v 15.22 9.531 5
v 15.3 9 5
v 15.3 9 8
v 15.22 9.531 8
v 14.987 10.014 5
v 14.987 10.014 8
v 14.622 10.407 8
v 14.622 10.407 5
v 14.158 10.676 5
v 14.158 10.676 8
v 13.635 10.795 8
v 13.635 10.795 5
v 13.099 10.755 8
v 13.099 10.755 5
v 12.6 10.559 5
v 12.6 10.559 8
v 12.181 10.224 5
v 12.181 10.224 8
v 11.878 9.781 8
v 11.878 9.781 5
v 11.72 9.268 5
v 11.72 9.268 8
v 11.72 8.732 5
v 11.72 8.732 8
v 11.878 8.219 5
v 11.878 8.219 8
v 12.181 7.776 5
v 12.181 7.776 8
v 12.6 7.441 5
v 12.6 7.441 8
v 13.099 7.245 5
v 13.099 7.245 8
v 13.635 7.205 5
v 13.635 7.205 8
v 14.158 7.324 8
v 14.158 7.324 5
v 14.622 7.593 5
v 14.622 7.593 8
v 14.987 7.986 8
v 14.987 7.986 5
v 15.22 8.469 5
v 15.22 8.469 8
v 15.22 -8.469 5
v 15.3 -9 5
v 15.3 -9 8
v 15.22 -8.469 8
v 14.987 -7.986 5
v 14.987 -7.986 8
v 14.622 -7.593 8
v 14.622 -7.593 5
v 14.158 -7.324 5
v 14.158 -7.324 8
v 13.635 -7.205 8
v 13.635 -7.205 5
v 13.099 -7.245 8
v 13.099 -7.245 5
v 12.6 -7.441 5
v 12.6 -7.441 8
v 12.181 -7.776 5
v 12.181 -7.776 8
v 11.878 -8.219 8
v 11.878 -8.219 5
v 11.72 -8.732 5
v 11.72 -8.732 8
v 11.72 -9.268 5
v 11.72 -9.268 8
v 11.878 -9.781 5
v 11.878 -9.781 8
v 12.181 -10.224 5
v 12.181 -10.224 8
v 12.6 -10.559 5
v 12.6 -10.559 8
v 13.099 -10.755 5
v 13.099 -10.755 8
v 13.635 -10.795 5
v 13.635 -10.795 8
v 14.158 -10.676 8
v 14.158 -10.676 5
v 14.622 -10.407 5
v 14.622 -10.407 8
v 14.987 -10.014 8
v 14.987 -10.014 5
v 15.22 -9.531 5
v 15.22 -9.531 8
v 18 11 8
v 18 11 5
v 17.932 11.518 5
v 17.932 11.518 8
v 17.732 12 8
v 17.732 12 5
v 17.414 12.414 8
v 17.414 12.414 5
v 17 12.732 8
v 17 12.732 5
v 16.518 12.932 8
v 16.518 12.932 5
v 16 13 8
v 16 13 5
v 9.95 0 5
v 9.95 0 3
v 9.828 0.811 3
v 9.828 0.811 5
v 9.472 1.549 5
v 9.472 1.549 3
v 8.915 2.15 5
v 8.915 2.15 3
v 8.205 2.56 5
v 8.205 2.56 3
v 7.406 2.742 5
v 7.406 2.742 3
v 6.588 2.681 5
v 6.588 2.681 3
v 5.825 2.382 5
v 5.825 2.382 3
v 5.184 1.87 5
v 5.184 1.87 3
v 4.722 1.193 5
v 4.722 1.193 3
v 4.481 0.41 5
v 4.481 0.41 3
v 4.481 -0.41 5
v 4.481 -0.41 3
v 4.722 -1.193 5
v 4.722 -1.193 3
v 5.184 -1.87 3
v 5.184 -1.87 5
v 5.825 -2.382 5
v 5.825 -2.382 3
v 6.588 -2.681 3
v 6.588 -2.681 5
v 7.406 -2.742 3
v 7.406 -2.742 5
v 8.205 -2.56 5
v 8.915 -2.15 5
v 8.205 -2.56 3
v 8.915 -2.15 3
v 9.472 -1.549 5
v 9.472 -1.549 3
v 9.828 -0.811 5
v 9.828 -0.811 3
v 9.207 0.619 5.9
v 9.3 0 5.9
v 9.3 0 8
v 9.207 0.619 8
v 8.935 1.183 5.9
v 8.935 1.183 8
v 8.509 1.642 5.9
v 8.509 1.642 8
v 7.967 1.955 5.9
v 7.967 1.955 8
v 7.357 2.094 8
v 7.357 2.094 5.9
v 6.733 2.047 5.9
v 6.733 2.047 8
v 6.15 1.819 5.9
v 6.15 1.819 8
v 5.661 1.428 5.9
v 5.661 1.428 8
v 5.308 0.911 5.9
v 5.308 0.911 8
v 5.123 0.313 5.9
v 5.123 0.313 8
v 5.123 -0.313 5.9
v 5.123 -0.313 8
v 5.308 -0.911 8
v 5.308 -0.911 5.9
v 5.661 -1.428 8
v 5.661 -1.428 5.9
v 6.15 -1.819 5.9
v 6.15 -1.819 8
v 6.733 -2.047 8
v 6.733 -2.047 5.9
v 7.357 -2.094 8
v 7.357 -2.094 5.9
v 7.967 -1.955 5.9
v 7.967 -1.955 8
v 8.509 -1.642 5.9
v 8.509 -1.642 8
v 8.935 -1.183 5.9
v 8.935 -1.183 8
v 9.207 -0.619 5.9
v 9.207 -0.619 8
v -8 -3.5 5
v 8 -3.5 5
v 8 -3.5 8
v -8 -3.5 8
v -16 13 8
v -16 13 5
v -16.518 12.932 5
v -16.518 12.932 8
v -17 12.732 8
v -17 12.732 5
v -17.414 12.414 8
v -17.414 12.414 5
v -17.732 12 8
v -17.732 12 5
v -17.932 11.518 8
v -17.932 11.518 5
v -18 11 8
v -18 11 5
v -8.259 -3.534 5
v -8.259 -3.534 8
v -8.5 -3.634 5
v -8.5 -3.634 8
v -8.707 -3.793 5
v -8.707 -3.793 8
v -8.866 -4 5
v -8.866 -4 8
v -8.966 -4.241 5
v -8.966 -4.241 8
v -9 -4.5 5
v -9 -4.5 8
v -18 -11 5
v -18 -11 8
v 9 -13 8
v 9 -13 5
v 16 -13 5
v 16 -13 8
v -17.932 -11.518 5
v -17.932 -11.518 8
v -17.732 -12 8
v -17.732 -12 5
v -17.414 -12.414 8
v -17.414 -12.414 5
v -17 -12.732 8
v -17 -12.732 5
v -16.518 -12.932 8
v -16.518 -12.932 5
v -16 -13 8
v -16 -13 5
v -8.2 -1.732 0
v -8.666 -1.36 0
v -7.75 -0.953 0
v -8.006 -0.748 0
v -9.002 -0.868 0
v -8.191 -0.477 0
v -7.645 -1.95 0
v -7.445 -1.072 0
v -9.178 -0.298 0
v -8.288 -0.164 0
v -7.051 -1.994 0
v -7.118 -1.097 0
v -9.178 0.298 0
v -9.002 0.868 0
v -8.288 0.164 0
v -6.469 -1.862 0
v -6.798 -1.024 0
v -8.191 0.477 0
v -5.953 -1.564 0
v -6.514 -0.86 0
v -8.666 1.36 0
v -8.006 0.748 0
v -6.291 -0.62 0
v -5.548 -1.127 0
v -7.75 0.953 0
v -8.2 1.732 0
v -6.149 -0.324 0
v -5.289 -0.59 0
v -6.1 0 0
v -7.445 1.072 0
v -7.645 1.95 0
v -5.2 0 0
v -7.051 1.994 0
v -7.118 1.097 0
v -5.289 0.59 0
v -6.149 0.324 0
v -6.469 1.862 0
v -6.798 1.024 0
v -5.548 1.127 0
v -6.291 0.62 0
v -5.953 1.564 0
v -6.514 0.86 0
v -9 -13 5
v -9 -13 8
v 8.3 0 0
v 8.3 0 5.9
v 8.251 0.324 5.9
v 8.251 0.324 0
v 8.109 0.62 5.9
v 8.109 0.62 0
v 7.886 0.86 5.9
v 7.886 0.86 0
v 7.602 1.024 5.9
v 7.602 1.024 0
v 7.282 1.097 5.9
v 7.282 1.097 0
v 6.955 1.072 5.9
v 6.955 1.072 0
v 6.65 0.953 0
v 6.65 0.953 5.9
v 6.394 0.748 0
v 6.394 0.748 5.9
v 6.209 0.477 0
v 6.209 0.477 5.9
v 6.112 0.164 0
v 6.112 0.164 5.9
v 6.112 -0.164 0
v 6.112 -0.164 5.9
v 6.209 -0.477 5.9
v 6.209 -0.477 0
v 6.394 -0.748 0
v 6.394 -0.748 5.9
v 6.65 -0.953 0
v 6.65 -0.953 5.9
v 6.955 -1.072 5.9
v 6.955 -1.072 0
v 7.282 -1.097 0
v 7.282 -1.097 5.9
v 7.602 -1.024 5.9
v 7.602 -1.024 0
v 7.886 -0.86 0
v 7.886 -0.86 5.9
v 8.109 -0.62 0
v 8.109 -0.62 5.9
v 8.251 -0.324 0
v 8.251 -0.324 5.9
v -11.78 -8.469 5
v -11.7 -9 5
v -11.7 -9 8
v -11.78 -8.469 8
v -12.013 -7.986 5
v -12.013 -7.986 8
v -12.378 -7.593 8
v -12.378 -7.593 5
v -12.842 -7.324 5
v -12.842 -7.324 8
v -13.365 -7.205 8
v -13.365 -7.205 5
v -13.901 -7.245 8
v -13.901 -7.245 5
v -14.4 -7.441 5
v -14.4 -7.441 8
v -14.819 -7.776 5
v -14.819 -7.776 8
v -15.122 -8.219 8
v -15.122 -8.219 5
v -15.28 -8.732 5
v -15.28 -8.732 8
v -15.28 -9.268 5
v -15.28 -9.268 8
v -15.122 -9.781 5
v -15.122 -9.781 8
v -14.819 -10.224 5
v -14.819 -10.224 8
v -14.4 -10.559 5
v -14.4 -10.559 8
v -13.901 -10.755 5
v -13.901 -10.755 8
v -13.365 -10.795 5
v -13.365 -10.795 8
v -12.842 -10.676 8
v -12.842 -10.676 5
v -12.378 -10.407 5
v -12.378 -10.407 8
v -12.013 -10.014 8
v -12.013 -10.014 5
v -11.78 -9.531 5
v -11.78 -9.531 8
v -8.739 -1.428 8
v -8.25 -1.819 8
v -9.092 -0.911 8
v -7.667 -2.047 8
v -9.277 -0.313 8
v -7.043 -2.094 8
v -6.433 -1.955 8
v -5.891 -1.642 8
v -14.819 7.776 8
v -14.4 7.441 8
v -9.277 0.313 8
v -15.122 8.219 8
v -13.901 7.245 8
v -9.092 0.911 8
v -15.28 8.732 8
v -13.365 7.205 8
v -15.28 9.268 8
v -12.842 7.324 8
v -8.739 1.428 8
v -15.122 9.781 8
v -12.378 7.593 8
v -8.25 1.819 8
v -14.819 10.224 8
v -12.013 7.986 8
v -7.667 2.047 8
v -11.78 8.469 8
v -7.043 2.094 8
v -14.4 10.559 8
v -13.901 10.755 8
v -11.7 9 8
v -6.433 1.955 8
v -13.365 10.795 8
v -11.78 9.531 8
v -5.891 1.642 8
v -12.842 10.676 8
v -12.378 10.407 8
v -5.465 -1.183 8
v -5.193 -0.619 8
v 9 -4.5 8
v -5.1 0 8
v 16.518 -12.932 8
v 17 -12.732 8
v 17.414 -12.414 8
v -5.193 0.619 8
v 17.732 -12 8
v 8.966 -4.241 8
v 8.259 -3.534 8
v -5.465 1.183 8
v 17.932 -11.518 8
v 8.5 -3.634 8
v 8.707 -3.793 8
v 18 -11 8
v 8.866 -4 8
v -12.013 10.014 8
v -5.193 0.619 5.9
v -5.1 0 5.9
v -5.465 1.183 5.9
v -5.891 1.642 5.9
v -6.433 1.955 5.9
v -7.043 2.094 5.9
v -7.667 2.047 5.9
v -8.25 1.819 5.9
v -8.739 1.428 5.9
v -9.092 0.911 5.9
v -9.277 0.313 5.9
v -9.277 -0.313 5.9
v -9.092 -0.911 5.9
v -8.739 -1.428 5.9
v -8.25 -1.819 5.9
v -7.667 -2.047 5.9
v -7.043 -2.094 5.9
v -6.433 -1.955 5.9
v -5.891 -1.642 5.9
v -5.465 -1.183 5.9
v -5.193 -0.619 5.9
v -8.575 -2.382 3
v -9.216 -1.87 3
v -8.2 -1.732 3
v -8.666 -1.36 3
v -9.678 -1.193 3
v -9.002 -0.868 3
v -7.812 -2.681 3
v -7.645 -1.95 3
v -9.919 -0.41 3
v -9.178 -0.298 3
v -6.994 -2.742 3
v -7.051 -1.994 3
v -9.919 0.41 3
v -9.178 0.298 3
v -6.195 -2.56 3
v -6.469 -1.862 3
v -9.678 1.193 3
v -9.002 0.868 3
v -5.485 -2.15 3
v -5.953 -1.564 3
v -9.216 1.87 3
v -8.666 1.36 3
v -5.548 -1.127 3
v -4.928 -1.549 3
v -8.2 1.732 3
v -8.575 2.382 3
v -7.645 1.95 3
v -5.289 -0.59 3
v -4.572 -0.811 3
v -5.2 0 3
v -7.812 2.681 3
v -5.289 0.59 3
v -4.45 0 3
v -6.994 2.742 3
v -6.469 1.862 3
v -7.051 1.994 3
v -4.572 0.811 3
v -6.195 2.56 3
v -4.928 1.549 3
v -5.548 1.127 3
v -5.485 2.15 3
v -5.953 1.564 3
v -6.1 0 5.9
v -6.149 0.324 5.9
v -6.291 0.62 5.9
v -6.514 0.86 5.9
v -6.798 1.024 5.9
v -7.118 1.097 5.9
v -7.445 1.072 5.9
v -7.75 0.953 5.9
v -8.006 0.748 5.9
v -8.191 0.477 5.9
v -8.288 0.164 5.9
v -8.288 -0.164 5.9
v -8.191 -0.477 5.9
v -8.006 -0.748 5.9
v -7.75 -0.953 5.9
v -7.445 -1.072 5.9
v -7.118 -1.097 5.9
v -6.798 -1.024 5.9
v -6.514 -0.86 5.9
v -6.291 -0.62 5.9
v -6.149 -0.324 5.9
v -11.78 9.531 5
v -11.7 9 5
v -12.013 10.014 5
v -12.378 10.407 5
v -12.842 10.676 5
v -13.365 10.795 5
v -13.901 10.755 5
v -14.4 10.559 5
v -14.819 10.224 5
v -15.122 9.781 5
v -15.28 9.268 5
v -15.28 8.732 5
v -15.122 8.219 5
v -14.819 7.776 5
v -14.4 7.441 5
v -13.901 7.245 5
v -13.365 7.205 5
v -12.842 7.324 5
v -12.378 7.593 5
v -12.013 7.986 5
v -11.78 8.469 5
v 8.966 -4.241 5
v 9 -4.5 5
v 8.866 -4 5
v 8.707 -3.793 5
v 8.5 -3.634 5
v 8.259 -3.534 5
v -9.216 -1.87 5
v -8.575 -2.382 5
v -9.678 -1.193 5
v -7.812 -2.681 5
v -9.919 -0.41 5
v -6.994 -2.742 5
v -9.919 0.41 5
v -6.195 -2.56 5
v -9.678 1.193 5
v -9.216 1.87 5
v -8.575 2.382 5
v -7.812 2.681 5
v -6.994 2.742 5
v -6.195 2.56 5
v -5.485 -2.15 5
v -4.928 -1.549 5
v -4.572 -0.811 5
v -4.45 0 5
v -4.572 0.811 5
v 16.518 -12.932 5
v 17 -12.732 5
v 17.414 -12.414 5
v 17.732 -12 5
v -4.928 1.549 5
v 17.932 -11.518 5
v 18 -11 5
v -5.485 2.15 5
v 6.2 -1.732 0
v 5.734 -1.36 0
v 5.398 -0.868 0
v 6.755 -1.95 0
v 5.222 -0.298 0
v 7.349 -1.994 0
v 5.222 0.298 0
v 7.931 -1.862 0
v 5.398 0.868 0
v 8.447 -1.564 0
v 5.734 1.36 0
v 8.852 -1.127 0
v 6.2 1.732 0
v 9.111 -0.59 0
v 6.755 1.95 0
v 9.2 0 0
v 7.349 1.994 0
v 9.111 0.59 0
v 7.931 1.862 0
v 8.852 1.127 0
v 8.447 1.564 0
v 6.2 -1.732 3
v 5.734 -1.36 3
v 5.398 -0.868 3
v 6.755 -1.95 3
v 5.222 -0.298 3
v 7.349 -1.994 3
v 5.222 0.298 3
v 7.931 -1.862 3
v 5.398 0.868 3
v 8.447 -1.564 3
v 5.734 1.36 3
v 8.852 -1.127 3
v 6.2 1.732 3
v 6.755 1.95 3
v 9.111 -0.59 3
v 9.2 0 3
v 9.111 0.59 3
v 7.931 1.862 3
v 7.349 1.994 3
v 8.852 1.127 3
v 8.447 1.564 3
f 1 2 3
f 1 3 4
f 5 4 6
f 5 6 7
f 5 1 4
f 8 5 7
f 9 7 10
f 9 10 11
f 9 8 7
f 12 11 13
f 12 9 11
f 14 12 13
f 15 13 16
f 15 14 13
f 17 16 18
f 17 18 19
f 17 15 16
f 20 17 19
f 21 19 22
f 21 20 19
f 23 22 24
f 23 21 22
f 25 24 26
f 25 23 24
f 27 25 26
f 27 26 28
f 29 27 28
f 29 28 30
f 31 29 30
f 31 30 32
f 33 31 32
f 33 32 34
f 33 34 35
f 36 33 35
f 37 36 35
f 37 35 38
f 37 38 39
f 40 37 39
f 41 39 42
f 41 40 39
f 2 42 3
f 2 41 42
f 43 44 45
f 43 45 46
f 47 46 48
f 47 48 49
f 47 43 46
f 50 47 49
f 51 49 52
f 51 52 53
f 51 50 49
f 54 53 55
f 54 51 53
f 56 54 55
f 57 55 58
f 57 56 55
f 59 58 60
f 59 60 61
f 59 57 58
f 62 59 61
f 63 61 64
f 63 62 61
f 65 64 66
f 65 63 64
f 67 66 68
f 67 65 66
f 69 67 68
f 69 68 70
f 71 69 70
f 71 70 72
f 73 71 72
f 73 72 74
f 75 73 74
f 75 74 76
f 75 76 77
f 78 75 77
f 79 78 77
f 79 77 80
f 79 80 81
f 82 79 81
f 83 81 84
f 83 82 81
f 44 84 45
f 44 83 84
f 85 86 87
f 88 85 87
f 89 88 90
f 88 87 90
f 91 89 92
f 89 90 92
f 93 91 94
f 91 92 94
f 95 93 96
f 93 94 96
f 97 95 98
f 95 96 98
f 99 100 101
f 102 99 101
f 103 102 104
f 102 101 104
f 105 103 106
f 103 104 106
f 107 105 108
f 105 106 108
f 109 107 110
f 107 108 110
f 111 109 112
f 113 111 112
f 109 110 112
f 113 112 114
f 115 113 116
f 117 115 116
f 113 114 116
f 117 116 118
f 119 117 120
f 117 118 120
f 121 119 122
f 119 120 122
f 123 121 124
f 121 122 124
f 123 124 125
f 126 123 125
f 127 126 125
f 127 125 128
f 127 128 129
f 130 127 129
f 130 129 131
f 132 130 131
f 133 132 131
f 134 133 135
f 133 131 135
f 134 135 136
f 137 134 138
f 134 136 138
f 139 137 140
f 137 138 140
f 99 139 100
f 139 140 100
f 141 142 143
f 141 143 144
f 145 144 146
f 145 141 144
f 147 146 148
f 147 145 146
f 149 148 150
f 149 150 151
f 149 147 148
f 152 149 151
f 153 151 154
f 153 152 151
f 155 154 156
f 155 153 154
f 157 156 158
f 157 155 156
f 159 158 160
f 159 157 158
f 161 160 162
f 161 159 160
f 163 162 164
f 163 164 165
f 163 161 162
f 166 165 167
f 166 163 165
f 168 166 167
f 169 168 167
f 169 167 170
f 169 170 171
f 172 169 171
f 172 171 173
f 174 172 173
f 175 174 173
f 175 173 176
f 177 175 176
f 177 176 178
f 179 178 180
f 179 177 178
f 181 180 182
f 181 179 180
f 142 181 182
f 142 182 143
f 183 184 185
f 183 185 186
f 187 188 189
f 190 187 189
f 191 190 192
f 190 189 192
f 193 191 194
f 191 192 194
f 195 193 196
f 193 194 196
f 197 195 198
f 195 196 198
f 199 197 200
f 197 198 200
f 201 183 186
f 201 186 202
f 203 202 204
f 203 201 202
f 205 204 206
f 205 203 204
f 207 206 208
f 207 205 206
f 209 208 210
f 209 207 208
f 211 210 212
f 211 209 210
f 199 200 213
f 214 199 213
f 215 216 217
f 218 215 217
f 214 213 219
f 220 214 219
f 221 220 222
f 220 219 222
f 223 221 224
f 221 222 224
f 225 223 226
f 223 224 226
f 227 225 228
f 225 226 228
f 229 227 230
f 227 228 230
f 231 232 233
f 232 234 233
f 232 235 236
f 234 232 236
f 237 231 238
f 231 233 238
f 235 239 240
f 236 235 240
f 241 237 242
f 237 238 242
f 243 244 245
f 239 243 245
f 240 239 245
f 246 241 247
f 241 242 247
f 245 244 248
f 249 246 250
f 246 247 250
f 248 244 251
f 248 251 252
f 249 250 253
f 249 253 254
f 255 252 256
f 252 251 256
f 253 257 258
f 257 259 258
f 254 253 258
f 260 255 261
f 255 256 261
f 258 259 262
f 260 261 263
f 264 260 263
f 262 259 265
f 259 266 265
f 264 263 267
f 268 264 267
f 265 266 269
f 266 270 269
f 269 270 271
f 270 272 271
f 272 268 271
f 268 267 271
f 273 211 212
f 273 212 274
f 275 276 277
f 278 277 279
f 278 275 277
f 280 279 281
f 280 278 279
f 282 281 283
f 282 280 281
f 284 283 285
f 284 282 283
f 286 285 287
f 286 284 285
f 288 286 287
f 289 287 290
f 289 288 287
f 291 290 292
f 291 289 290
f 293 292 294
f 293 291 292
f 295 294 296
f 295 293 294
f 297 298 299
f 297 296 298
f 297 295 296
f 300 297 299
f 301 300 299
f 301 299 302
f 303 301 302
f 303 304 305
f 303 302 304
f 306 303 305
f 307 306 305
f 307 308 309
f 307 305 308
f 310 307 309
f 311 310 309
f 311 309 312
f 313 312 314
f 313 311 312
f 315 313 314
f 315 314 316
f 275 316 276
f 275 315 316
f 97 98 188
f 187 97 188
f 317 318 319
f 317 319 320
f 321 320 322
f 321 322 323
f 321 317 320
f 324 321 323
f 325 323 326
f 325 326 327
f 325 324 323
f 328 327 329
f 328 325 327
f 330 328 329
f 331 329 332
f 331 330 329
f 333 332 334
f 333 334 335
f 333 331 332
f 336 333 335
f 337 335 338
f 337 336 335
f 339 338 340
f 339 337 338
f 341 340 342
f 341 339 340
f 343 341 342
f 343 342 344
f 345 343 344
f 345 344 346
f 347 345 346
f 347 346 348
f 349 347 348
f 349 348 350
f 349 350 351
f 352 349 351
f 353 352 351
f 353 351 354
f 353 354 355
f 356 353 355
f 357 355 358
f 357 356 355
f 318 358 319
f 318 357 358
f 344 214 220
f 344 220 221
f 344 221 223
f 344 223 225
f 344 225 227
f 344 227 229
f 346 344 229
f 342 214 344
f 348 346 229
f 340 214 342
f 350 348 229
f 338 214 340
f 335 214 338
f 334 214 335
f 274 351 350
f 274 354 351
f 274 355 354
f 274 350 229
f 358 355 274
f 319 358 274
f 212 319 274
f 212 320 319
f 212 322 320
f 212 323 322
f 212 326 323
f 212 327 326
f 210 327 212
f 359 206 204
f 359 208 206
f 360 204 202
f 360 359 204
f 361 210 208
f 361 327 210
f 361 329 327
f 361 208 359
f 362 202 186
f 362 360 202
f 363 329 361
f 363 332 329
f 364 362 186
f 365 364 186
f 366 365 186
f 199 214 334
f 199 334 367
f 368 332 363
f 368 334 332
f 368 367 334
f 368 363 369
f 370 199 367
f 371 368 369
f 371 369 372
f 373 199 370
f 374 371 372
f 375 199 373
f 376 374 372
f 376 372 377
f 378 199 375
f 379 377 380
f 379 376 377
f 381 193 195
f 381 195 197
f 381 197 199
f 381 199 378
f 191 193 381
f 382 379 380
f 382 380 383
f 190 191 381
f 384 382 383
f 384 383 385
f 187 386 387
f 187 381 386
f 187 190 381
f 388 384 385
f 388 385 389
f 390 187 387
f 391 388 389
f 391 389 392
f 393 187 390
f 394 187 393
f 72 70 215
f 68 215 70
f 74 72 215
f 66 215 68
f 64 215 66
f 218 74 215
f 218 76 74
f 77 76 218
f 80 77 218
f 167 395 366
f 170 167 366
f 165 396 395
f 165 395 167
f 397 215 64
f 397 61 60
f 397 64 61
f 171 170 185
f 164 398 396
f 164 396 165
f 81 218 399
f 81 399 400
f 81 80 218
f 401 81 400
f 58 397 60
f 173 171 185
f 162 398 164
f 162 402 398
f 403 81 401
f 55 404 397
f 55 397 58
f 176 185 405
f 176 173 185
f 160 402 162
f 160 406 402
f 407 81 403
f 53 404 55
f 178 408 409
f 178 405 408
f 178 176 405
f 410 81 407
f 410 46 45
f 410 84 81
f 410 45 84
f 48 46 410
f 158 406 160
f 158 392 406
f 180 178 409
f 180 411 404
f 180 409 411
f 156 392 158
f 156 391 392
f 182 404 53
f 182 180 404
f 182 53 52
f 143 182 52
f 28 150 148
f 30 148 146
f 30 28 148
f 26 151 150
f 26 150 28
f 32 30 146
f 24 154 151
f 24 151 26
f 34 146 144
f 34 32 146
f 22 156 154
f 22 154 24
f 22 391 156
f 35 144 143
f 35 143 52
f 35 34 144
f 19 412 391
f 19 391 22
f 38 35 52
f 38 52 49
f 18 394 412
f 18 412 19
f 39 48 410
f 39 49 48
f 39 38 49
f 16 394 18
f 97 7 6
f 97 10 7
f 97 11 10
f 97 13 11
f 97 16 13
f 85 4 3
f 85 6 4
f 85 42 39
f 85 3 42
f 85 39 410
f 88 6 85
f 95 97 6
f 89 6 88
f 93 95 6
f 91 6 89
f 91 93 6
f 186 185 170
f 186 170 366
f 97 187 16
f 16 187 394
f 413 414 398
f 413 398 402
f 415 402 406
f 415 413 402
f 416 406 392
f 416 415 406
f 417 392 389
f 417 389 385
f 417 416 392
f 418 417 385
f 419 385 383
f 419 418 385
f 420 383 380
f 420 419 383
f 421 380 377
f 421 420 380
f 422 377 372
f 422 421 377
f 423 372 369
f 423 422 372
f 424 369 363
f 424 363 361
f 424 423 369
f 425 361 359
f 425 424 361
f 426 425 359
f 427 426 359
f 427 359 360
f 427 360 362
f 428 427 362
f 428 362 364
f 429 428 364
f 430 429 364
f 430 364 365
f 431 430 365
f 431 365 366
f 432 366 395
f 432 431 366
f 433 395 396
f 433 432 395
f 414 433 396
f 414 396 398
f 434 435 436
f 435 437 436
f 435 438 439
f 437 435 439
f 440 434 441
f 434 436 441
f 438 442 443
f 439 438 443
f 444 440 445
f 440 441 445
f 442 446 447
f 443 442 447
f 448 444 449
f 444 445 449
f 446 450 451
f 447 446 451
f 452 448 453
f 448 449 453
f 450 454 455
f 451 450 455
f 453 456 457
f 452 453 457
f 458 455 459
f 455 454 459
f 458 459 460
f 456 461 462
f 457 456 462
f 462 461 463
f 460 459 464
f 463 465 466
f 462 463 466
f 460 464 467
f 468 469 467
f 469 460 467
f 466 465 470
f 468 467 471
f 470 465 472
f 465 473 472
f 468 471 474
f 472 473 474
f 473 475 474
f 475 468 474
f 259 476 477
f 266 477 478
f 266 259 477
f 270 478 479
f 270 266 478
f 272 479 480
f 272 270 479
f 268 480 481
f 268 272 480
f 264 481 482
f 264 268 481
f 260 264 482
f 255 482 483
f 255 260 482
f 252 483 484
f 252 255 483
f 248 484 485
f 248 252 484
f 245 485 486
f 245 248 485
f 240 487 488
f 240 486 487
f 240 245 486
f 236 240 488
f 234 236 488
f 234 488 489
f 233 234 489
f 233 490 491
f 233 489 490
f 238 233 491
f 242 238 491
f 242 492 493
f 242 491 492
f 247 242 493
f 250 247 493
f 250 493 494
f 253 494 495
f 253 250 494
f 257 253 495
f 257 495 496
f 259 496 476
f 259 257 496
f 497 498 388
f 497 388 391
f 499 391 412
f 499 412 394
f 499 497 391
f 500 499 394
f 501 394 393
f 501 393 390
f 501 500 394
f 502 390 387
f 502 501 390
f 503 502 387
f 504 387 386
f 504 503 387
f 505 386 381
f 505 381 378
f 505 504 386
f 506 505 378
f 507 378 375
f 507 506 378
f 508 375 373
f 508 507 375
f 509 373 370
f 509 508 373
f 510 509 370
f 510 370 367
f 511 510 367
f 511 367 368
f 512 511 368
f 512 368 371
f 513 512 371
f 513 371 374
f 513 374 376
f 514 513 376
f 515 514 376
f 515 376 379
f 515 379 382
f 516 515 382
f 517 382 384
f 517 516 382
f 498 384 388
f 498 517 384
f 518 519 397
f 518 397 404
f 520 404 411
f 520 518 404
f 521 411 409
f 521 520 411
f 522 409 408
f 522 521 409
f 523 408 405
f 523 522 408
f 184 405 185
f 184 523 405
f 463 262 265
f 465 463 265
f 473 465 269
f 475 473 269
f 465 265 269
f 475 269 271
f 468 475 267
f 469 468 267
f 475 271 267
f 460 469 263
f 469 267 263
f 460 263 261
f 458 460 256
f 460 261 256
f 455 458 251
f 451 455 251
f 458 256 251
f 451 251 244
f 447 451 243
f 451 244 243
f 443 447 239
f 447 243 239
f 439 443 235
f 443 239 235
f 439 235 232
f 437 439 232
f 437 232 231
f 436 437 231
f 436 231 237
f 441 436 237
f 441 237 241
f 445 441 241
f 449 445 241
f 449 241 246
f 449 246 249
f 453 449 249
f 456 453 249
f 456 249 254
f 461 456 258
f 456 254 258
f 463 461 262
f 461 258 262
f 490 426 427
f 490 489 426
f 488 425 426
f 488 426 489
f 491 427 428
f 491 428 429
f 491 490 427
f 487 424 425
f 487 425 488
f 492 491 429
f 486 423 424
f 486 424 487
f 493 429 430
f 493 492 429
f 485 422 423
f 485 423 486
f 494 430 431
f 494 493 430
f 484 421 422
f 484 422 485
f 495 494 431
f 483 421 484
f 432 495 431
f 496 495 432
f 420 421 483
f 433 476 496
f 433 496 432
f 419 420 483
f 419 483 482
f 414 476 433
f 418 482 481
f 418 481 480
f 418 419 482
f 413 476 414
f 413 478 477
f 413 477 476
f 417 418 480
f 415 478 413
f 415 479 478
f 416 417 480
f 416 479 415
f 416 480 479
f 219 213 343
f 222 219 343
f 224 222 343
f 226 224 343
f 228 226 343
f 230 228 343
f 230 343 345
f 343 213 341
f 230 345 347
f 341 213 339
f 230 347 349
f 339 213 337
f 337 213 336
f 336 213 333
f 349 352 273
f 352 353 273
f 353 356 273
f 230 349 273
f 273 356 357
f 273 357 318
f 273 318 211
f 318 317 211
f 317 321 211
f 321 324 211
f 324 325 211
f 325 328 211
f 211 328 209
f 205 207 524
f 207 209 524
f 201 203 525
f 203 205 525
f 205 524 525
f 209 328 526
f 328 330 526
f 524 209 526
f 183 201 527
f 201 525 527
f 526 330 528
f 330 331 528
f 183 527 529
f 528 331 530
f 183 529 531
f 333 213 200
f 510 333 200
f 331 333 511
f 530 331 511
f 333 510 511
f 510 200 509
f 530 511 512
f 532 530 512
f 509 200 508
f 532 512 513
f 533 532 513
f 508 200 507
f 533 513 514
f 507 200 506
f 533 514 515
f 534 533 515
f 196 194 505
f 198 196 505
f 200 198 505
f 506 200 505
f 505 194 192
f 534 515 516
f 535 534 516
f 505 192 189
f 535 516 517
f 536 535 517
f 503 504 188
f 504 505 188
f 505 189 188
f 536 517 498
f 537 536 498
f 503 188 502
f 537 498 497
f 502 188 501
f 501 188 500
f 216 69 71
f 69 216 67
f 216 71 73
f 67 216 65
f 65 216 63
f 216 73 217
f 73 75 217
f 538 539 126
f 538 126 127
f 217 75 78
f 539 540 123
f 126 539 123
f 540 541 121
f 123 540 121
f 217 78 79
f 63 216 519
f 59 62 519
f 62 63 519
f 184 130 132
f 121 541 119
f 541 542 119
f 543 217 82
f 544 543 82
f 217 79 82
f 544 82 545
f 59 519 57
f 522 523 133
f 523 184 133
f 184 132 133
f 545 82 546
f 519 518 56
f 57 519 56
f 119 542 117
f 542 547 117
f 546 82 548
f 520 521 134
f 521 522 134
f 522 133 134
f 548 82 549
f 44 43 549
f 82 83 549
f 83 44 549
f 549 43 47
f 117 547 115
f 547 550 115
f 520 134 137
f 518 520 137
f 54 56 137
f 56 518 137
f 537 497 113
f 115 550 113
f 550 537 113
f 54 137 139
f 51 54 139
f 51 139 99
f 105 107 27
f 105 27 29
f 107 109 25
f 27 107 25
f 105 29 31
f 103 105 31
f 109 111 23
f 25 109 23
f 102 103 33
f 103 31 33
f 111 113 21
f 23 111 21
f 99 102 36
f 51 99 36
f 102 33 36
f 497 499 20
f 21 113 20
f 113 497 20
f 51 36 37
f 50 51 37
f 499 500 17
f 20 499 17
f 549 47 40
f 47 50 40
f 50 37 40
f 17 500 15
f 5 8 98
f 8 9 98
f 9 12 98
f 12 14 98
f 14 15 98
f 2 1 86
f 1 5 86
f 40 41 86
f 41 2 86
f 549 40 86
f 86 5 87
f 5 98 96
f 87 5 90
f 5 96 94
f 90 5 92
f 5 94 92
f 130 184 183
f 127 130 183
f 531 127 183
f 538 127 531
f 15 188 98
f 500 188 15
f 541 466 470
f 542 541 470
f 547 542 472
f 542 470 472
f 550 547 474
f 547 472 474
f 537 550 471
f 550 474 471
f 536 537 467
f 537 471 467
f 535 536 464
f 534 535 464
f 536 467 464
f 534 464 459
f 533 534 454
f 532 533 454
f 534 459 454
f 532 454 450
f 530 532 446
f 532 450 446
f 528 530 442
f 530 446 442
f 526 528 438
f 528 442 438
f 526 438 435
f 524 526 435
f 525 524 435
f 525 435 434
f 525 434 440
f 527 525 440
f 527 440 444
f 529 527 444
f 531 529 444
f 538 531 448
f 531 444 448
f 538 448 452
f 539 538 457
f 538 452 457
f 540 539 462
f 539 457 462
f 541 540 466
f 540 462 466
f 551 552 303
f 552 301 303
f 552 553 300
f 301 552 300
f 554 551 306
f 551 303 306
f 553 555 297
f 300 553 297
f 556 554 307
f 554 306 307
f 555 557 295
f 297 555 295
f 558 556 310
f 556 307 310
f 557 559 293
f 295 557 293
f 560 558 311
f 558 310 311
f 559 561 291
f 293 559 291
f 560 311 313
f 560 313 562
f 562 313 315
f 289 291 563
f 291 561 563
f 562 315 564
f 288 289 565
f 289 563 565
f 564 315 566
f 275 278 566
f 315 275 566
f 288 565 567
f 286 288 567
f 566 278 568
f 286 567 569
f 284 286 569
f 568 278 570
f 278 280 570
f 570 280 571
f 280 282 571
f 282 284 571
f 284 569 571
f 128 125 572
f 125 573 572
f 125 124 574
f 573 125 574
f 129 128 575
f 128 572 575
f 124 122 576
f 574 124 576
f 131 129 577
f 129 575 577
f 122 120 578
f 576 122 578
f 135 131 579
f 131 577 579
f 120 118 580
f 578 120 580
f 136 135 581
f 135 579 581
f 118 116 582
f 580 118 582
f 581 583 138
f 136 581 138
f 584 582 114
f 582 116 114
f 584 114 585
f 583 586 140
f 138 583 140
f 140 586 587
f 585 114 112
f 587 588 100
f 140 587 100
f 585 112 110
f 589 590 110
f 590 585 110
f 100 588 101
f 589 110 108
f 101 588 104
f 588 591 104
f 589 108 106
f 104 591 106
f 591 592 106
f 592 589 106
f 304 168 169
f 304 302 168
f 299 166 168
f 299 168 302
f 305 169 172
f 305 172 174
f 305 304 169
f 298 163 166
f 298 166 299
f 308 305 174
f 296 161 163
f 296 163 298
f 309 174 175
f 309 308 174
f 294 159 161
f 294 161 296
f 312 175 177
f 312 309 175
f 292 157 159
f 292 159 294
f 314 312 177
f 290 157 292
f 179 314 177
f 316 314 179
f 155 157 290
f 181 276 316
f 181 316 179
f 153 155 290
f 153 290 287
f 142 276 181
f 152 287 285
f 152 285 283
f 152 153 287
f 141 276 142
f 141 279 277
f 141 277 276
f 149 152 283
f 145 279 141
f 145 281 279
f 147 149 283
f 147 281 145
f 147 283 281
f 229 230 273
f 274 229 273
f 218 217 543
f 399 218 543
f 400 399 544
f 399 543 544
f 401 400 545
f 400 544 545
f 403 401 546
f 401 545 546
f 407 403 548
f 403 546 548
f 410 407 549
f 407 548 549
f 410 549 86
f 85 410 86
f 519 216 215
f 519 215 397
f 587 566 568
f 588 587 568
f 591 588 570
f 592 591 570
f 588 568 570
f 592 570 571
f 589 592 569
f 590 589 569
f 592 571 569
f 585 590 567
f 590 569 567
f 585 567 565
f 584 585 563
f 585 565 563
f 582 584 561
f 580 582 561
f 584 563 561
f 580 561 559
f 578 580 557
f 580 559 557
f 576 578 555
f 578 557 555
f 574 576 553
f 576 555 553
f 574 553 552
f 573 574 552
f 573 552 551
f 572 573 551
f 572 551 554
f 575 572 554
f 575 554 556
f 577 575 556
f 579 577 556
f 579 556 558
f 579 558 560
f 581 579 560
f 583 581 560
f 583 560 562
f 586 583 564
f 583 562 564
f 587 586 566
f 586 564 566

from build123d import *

# Parameters (mm, degrees)
EXTRUDE_START            = 5
EXTRUDE_3_Z5_DEPTH       = 3
CUT_EXTRUDE_START        = 5
CUT_EXTRUDE_U_18_DEPTH   = 3
EXTRUDE_START_2          = 3
SKETCH_3_R               = 2.75
EXTRUDE_2_Z3_5_DEPTH     = 2
SKETCH_4_R               = 2
EXTRUDE_3_Z0_3_DEPTH     = 3
SKETCH_5_R               = 1.1
CUT_EXTRUDE_2X_2_2_DEPTH = 8
CUT_EXTRUDE_START_2      = 5.9
SKETCH_6_R               = 2.1
CUT_EXTRUDE_2_1_DEPTH    = 2.1
SKETCH_7_R               = 1.8
CUT_EXTRUDE_4X_3_6_DEPTH = 3


with BuildPart() as part:
    # 草图1 → 背板拉伸_厚3_前面Z5 (new body)
    with BuildSketch(Plane.XY.offset(EXTRUDE_START)):
        with BuildLine():
            Line((-16, -13), (16, -13))
            ThreePointArc((16, -13), (17.414213562, -12.414213562), (18, -11))
            Line((18, -11), (18, 11))
            ThreePointArc((18, 11), (17.414213562, 12.414213562), (16, 13))
            Line((16, 13), (-16, 13))
            ThreePointArc((-16, 13), (-17.414213562, 12.414213562), (-18, 11))
            Line((-18, 11), (-18, -11))
            ThreePointArc((-18, -11), (-17.414213562, -12.414213562), (-16, -13))
        make_face()
    extrude(amount=EXTRUDE_3_Z5_DEPTH)

    # 草图2 → 下方U口_宽18_向下敞开 (cut)
    with BuildSketch(Plane.XY.offset(CUT_EXTRUDE_START)):
        with BuildLine():
            Line((-8, -20), (8, -20))
            ThreePointArc((8, -20), (8.707106781, -19.707106781), (9, -19))
            Line((9, -19), (9, -4.5))
            ThreePointArc((9, -4.5), (8.707106781, -3.792893219), (8, -3.5))
            Line((8, -3.5), (-8, -3.5))
            ThreePointArc((-8, -3.5), (-8.707106781, -3.792893219), (-9, -4.5))
            Line((-9, -4.5), (-9, -19))
            ThreePointArc((-9, -19), (-8.707106781, -19.707106781), (-8, -20))
        make_face()
    extrude(amount=CUT_EXTRUDE_U_18_DEPTH, mode=Mode.SUBTRACT)

    # 草图3 → 两根支柱主体_高2_Z3至5 (add)
    with BuildSketch(Plane.XY.offset(EXTRUDE_START_2)):
        with Locations((-7.2, 0)):
            Circle(SKETCH_3_R)
        with Locations((7.2, 0)):
            Circle(SKETCH_3_R)
    extrude(amount=EXTRUDE_2_Z3_5_DEPTH)

    # 草图4 → 两根接触细颈_高3_Z0至3 (add)
    with BuildSketch(Plane.XY):
        with Locations((-7.2, 0)):
            Circle(SKETCH_4_R)
        with Locations((7.2, 0)):
            Circle(SKETCH_4_R)
    extrude(amount=EXTRUDE_3_Z0_3_DEPTH)

    # 草图5 → 模块固定孔_2x直径2.2_贯穿 (cut)
    with BuildSketch(Plane.XY):
        with Locations((-7.2, 0)):
            Circle(SKETCH_5_R)
        with Locations((7.2, 0)):
            Circle(SKETCH_5_R)
    extrude(amount=CUT_EXTRUDE_2X_2_2_DEPTH, mode=Mode.SUBTRACT)

    # 草图6 → 背面螺丝头沉孔_深2.1 (cut)
    with BuildSketch(Plane.XY.offset(CUT_EXTRUDE_START_2)):
        with Locations((-7.2, 0)):
            Circle(SKETCH_6_R)
        with Locations((7.2, 0)):
            Circle(SKETCH_6_R)
    extrude(amount=CUT_EXTRUDE_2_1_DEPTH, mode=Mode.SUBTRACT)

    # 草图7 → 后续连接孔_4x直径3.6_贯穿 (cut)
    with BuildSketch(Plane.XY.offset(CUT_EXTRUDE_START)):
        with Locations((-13.5, -9)):
            Circle(SKETCH_7_R)
        with Locations((-13.5, 9)):
            Circle(SKETCH_7_R)
        with Locations((13.5, -9)):
            Circle(SKETCH_7_R)
        with Locations((13.5, 9)):
            Circle(SKETCH_7_R)
    extrude(amount=CUT_EXTRUDE_4X_3_6_DEPTH, mode=Mode.SUBTRACT)


solid = part.part
